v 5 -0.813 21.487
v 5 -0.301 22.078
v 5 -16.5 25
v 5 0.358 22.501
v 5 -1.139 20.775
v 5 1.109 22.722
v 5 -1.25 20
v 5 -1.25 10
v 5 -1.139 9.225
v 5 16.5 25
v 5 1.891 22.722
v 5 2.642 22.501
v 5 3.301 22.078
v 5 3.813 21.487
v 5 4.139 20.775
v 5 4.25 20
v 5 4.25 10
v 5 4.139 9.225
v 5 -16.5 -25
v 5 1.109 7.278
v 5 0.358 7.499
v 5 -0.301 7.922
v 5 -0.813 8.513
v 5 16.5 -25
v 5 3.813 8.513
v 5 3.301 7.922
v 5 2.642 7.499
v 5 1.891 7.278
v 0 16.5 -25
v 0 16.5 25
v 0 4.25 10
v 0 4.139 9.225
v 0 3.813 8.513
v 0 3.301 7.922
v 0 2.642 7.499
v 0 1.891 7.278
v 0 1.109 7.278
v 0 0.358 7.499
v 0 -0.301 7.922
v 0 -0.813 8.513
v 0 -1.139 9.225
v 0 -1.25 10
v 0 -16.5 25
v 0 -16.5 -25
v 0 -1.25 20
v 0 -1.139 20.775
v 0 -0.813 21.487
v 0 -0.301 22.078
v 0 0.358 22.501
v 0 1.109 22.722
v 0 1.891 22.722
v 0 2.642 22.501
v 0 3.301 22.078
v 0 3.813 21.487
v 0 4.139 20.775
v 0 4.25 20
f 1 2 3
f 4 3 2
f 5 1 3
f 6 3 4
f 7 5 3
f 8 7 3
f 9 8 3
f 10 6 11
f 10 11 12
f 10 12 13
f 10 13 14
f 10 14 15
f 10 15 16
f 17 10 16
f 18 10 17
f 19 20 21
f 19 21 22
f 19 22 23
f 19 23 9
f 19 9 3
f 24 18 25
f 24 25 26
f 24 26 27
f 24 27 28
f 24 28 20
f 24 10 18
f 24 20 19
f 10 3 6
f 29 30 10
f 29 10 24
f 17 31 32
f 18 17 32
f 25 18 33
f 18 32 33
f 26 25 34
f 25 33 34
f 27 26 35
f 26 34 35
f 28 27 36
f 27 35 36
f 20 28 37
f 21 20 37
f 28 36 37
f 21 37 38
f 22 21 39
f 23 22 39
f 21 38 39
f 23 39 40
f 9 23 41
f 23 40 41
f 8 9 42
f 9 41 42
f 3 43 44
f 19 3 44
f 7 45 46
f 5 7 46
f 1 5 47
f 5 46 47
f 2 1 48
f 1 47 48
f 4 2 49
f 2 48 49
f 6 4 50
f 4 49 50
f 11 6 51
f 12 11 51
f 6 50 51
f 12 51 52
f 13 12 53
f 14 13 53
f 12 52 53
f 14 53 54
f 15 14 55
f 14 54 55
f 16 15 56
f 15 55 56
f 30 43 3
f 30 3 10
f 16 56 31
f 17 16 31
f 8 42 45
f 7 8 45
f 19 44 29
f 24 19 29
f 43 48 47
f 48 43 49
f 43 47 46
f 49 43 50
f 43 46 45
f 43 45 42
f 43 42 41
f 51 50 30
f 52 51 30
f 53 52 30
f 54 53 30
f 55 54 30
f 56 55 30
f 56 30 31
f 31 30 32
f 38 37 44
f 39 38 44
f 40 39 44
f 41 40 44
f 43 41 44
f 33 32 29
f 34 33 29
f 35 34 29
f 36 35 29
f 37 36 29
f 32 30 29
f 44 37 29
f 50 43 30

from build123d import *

# Parameters (mm, degrees)
SKETCH1_W      = 50
SKETCH1_H      = 33
EXTRUDE1_DEPTH = 5


with BuildPart() as part:
    # Sketch1 → Extrude1 (new body)
    with BuildSketch(Plane(origin=(0, 0, 0), x_dir=(0, 0, -1), z_dir=(1, 0, 0))):
        Rectangle(SKETCH1_W, SKETCH1_H)
        with BuildLine():
            Line((-20, 4.25), (-10, 4.25))
            ThreePointArc((-10, 4.25), (-7.25, 1.5), (-10, -1.25))
            Line((-10, -1.25), (-20, -1.25))
            ThreePointArc((-20, -1.25), (-22.75, 1.5), (-20, 4.25))
        make_face(mode=Mode.SUBTRACT)
    extrude(amount=EXTRUDE1_DEPTH)


solid = part.part
